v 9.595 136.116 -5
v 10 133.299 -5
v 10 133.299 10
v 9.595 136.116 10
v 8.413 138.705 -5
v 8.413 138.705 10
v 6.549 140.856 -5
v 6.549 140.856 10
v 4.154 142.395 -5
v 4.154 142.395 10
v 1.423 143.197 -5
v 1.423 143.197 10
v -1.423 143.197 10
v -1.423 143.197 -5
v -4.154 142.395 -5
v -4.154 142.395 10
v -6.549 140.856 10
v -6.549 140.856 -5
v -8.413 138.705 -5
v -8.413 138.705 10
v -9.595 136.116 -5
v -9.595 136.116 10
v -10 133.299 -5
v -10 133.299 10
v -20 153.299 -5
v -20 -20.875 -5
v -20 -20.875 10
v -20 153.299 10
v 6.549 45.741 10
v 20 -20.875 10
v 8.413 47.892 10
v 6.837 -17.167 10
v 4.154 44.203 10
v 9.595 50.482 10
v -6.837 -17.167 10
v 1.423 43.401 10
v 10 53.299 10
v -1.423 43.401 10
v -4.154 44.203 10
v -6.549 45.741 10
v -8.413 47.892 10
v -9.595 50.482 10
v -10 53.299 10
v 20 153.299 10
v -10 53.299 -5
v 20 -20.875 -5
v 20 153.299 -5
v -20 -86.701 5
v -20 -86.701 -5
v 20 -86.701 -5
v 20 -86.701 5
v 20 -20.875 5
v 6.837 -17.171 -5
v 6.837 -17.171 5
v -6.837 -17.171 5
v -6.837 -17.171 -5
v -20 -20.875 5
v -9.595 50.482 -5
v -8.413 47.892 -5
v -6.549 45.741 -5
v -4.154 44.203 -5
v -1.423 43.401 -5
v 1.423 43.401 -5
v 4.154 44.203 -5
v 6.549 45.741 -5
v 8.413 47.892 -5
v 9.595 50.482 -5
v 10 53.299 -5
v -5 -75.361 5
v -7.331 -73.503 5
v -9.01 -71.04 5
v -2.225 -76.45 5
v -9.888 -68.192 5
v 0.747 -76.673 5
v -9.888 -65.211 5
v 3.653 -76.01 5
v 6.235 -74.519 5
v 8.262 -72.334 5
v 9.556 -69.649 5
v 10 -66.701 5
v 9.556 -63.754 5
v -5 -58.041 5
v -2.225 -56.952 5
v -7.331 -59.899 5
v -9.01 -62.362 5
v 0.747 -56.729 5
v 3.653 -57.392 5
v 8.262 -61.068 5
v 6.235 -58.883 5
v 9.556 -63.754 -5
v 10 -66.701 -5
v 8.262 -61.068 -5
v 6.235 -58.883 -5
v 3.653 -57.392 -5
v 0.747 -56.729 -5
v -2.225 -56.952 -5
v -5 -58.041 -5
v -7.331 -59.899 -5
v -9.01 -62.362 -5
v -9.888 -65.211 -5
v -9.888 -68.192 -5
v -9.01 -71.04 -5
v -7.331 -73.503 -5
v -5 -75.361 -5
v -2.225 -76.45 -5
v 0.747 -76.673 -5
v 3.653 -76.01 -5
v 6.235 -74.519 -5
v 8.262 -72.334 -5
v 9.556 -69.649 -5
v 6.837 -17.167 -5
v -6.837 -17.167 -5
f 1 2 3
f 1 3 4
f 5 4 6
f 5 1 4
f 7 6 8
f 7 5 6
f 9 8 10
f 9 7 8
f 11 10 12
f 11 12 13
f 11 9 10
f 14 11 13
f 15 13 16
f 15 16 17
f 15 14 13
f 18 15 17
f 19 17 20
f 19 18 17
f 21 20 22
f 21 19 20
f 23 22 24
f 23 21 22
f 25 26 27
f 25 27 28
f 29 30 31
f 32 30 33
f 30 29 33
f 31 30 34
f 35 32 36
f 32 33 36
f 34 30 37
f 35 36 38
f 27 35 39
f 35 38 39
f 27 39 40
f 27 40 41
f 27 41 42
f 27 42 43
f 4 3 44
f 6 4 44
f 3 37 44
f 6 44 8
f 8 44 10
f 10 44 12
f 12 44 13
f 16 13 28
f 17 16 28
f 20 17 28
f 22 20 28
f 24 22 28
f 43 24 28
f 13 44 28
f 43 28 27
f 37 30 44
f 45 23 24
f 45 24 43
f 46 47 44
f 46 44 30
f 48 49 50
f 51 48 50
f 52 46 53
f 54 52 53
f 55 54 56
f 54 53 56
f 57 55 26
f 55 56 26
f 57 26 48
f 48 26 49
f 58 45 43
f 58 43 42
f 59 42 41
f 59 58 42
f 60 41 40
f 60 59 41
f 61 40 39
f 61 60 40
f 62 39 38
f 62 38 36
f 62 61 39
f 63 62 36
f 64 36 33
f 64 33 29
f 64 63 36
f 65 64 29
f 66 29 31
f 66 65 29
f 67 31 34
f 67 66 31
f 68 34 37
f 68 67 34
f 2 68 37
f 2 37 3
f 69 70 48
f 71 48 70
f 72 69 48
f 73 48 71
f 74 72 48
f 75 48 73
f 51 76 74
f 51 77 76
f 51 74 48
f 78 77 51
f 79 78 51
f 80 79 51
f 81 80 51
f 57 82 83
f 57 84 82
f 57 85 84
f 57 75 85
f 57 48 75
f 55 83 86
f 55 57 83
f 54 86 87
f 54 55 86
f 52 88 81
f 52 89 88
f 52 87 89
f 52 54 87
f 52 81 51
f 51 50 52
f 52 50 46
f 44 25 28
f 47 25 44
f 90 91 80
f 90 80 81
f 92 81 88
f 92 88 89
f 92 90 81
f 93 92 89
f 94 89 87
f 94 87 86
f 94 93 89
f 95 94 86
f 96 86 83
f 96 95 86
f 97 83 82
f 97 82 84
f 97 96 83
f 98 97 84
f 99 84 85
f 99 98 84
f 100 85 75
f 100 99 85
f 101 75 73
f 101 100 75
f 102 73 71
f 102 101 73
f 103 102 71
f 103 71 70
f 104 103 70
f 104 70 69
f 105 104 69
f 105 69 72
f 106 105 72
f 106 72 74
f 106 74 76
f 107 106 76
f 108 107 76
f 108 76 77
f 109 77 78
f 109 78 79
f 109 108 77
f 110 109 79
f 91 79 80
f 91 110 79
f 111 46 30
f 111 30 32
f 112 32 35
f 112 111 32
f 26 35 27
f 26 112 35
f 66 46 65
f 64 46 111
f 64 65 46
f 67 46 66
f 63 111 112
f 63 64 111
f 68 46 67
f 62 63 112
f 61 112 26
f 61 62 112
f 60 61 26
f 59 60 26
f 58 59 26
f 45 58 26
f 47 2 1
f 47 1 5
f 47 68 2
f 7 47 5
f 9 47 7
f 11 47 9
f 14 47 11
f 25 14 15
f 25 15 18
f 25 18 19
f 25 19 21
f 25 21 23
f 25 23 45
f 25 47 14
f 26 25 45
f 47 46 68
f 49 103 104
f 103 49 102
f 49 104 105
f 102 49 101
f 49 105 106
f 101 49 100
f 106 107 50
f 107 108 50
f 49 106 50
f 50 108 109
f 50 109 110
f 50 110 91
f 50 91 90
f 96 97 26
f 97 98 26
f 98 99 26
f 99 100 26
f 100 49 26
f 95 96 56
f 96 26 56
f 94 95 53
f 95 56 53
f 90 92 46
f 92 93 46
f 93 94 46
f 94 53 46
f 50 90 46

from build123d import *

# Parameters (mm, degrees)
RESSALTO_EXTRUS_O3_DEPTH      = 5
RESSALTO_EXTRUS_O3_DEPTH_BACK = 5
ESBO_O5_R                     = 10
RESSALTO_EXTRUS_O4_DEPTH      = 5
RESSALTO_EXTRUS_O4_DEPTH_BACK = 10


with BuildPart() as part:
    # Esboço5 → Ressalto-extrusão3 (new, two sides: drawn at the far end of the back side and taken through both)
    with BuildSketch(Plane.XY.offset(-RESSALTO_EXTRUS_O3_DEPTH_BACK)):
        with BuildLine():
            Line((-20, -86.701140479), (20, -86.701140479))
            Line((20, -86.701140479), (20, -20.87538353))
            ThreePointArc((20, -20.87538353), (0, -16.701140479), (-20, -20.87538353))
            Line((-20, -20.87538353), (-20, -86.701140479))
        make_face()
        with Locations((0, -66.701140479)):
            Circle(ESBO_O5_R, mode=Mode.SUBTRACT)
    extrude(amount=RESSALTO_EXTRUS_O3_DEPTH + RESSALTO_EXTRUS_O3_DEPTH_BACK)


with BuildPart() as body_2:
    # Esboço7 → Ressalto-extrusão4 (new, two sides: drawn at the far end of the back side and taken through both)
    with BuildSketch(Plane.XY.offset(5).offset(-RESSALTO_EXTRUS_O4_DEPTH_BACK)):
        with BuildLine():
            ThreePointArc((-20, -20.87538353), (0, -16.697321711), (20, -20.87538353))
            Line((20, -20.87538353), (20, 153.298859521))
            Line((20, 153.298859521), (0, 153.298859521))
            Line((0, 153.298859521), (-20, 153.298859521))
            Line((-20, 153.298859521), (-20, -20.87538353))
        make_face()
        with BuildLine():
            ThreePointArc((-10, 133.298859521), (-7.071067812, 140.369927333), (0, 143.298859521))
            ThreePointArc((0, 143.298859521), (7.071067812, 140.369927333), (10, 133.298859521))
            Line((10, 133.298859521), (10, 53.298859521))
            ThreePointArc((10, 53.298859521), (0, 43.298859521), (-10, 53.298859521))
            Line((-10, 53.298859521), (-10, 133.298859521))
        make_face(mode=Mode.SUBTRACT)
    extrude(amount=RESSALTO_EXTRUS_O4_DEPTH + RESSALTO_EXTRUS_O4_DEPTH_BACK)


solid = Compound([part.part, body_2.part])
